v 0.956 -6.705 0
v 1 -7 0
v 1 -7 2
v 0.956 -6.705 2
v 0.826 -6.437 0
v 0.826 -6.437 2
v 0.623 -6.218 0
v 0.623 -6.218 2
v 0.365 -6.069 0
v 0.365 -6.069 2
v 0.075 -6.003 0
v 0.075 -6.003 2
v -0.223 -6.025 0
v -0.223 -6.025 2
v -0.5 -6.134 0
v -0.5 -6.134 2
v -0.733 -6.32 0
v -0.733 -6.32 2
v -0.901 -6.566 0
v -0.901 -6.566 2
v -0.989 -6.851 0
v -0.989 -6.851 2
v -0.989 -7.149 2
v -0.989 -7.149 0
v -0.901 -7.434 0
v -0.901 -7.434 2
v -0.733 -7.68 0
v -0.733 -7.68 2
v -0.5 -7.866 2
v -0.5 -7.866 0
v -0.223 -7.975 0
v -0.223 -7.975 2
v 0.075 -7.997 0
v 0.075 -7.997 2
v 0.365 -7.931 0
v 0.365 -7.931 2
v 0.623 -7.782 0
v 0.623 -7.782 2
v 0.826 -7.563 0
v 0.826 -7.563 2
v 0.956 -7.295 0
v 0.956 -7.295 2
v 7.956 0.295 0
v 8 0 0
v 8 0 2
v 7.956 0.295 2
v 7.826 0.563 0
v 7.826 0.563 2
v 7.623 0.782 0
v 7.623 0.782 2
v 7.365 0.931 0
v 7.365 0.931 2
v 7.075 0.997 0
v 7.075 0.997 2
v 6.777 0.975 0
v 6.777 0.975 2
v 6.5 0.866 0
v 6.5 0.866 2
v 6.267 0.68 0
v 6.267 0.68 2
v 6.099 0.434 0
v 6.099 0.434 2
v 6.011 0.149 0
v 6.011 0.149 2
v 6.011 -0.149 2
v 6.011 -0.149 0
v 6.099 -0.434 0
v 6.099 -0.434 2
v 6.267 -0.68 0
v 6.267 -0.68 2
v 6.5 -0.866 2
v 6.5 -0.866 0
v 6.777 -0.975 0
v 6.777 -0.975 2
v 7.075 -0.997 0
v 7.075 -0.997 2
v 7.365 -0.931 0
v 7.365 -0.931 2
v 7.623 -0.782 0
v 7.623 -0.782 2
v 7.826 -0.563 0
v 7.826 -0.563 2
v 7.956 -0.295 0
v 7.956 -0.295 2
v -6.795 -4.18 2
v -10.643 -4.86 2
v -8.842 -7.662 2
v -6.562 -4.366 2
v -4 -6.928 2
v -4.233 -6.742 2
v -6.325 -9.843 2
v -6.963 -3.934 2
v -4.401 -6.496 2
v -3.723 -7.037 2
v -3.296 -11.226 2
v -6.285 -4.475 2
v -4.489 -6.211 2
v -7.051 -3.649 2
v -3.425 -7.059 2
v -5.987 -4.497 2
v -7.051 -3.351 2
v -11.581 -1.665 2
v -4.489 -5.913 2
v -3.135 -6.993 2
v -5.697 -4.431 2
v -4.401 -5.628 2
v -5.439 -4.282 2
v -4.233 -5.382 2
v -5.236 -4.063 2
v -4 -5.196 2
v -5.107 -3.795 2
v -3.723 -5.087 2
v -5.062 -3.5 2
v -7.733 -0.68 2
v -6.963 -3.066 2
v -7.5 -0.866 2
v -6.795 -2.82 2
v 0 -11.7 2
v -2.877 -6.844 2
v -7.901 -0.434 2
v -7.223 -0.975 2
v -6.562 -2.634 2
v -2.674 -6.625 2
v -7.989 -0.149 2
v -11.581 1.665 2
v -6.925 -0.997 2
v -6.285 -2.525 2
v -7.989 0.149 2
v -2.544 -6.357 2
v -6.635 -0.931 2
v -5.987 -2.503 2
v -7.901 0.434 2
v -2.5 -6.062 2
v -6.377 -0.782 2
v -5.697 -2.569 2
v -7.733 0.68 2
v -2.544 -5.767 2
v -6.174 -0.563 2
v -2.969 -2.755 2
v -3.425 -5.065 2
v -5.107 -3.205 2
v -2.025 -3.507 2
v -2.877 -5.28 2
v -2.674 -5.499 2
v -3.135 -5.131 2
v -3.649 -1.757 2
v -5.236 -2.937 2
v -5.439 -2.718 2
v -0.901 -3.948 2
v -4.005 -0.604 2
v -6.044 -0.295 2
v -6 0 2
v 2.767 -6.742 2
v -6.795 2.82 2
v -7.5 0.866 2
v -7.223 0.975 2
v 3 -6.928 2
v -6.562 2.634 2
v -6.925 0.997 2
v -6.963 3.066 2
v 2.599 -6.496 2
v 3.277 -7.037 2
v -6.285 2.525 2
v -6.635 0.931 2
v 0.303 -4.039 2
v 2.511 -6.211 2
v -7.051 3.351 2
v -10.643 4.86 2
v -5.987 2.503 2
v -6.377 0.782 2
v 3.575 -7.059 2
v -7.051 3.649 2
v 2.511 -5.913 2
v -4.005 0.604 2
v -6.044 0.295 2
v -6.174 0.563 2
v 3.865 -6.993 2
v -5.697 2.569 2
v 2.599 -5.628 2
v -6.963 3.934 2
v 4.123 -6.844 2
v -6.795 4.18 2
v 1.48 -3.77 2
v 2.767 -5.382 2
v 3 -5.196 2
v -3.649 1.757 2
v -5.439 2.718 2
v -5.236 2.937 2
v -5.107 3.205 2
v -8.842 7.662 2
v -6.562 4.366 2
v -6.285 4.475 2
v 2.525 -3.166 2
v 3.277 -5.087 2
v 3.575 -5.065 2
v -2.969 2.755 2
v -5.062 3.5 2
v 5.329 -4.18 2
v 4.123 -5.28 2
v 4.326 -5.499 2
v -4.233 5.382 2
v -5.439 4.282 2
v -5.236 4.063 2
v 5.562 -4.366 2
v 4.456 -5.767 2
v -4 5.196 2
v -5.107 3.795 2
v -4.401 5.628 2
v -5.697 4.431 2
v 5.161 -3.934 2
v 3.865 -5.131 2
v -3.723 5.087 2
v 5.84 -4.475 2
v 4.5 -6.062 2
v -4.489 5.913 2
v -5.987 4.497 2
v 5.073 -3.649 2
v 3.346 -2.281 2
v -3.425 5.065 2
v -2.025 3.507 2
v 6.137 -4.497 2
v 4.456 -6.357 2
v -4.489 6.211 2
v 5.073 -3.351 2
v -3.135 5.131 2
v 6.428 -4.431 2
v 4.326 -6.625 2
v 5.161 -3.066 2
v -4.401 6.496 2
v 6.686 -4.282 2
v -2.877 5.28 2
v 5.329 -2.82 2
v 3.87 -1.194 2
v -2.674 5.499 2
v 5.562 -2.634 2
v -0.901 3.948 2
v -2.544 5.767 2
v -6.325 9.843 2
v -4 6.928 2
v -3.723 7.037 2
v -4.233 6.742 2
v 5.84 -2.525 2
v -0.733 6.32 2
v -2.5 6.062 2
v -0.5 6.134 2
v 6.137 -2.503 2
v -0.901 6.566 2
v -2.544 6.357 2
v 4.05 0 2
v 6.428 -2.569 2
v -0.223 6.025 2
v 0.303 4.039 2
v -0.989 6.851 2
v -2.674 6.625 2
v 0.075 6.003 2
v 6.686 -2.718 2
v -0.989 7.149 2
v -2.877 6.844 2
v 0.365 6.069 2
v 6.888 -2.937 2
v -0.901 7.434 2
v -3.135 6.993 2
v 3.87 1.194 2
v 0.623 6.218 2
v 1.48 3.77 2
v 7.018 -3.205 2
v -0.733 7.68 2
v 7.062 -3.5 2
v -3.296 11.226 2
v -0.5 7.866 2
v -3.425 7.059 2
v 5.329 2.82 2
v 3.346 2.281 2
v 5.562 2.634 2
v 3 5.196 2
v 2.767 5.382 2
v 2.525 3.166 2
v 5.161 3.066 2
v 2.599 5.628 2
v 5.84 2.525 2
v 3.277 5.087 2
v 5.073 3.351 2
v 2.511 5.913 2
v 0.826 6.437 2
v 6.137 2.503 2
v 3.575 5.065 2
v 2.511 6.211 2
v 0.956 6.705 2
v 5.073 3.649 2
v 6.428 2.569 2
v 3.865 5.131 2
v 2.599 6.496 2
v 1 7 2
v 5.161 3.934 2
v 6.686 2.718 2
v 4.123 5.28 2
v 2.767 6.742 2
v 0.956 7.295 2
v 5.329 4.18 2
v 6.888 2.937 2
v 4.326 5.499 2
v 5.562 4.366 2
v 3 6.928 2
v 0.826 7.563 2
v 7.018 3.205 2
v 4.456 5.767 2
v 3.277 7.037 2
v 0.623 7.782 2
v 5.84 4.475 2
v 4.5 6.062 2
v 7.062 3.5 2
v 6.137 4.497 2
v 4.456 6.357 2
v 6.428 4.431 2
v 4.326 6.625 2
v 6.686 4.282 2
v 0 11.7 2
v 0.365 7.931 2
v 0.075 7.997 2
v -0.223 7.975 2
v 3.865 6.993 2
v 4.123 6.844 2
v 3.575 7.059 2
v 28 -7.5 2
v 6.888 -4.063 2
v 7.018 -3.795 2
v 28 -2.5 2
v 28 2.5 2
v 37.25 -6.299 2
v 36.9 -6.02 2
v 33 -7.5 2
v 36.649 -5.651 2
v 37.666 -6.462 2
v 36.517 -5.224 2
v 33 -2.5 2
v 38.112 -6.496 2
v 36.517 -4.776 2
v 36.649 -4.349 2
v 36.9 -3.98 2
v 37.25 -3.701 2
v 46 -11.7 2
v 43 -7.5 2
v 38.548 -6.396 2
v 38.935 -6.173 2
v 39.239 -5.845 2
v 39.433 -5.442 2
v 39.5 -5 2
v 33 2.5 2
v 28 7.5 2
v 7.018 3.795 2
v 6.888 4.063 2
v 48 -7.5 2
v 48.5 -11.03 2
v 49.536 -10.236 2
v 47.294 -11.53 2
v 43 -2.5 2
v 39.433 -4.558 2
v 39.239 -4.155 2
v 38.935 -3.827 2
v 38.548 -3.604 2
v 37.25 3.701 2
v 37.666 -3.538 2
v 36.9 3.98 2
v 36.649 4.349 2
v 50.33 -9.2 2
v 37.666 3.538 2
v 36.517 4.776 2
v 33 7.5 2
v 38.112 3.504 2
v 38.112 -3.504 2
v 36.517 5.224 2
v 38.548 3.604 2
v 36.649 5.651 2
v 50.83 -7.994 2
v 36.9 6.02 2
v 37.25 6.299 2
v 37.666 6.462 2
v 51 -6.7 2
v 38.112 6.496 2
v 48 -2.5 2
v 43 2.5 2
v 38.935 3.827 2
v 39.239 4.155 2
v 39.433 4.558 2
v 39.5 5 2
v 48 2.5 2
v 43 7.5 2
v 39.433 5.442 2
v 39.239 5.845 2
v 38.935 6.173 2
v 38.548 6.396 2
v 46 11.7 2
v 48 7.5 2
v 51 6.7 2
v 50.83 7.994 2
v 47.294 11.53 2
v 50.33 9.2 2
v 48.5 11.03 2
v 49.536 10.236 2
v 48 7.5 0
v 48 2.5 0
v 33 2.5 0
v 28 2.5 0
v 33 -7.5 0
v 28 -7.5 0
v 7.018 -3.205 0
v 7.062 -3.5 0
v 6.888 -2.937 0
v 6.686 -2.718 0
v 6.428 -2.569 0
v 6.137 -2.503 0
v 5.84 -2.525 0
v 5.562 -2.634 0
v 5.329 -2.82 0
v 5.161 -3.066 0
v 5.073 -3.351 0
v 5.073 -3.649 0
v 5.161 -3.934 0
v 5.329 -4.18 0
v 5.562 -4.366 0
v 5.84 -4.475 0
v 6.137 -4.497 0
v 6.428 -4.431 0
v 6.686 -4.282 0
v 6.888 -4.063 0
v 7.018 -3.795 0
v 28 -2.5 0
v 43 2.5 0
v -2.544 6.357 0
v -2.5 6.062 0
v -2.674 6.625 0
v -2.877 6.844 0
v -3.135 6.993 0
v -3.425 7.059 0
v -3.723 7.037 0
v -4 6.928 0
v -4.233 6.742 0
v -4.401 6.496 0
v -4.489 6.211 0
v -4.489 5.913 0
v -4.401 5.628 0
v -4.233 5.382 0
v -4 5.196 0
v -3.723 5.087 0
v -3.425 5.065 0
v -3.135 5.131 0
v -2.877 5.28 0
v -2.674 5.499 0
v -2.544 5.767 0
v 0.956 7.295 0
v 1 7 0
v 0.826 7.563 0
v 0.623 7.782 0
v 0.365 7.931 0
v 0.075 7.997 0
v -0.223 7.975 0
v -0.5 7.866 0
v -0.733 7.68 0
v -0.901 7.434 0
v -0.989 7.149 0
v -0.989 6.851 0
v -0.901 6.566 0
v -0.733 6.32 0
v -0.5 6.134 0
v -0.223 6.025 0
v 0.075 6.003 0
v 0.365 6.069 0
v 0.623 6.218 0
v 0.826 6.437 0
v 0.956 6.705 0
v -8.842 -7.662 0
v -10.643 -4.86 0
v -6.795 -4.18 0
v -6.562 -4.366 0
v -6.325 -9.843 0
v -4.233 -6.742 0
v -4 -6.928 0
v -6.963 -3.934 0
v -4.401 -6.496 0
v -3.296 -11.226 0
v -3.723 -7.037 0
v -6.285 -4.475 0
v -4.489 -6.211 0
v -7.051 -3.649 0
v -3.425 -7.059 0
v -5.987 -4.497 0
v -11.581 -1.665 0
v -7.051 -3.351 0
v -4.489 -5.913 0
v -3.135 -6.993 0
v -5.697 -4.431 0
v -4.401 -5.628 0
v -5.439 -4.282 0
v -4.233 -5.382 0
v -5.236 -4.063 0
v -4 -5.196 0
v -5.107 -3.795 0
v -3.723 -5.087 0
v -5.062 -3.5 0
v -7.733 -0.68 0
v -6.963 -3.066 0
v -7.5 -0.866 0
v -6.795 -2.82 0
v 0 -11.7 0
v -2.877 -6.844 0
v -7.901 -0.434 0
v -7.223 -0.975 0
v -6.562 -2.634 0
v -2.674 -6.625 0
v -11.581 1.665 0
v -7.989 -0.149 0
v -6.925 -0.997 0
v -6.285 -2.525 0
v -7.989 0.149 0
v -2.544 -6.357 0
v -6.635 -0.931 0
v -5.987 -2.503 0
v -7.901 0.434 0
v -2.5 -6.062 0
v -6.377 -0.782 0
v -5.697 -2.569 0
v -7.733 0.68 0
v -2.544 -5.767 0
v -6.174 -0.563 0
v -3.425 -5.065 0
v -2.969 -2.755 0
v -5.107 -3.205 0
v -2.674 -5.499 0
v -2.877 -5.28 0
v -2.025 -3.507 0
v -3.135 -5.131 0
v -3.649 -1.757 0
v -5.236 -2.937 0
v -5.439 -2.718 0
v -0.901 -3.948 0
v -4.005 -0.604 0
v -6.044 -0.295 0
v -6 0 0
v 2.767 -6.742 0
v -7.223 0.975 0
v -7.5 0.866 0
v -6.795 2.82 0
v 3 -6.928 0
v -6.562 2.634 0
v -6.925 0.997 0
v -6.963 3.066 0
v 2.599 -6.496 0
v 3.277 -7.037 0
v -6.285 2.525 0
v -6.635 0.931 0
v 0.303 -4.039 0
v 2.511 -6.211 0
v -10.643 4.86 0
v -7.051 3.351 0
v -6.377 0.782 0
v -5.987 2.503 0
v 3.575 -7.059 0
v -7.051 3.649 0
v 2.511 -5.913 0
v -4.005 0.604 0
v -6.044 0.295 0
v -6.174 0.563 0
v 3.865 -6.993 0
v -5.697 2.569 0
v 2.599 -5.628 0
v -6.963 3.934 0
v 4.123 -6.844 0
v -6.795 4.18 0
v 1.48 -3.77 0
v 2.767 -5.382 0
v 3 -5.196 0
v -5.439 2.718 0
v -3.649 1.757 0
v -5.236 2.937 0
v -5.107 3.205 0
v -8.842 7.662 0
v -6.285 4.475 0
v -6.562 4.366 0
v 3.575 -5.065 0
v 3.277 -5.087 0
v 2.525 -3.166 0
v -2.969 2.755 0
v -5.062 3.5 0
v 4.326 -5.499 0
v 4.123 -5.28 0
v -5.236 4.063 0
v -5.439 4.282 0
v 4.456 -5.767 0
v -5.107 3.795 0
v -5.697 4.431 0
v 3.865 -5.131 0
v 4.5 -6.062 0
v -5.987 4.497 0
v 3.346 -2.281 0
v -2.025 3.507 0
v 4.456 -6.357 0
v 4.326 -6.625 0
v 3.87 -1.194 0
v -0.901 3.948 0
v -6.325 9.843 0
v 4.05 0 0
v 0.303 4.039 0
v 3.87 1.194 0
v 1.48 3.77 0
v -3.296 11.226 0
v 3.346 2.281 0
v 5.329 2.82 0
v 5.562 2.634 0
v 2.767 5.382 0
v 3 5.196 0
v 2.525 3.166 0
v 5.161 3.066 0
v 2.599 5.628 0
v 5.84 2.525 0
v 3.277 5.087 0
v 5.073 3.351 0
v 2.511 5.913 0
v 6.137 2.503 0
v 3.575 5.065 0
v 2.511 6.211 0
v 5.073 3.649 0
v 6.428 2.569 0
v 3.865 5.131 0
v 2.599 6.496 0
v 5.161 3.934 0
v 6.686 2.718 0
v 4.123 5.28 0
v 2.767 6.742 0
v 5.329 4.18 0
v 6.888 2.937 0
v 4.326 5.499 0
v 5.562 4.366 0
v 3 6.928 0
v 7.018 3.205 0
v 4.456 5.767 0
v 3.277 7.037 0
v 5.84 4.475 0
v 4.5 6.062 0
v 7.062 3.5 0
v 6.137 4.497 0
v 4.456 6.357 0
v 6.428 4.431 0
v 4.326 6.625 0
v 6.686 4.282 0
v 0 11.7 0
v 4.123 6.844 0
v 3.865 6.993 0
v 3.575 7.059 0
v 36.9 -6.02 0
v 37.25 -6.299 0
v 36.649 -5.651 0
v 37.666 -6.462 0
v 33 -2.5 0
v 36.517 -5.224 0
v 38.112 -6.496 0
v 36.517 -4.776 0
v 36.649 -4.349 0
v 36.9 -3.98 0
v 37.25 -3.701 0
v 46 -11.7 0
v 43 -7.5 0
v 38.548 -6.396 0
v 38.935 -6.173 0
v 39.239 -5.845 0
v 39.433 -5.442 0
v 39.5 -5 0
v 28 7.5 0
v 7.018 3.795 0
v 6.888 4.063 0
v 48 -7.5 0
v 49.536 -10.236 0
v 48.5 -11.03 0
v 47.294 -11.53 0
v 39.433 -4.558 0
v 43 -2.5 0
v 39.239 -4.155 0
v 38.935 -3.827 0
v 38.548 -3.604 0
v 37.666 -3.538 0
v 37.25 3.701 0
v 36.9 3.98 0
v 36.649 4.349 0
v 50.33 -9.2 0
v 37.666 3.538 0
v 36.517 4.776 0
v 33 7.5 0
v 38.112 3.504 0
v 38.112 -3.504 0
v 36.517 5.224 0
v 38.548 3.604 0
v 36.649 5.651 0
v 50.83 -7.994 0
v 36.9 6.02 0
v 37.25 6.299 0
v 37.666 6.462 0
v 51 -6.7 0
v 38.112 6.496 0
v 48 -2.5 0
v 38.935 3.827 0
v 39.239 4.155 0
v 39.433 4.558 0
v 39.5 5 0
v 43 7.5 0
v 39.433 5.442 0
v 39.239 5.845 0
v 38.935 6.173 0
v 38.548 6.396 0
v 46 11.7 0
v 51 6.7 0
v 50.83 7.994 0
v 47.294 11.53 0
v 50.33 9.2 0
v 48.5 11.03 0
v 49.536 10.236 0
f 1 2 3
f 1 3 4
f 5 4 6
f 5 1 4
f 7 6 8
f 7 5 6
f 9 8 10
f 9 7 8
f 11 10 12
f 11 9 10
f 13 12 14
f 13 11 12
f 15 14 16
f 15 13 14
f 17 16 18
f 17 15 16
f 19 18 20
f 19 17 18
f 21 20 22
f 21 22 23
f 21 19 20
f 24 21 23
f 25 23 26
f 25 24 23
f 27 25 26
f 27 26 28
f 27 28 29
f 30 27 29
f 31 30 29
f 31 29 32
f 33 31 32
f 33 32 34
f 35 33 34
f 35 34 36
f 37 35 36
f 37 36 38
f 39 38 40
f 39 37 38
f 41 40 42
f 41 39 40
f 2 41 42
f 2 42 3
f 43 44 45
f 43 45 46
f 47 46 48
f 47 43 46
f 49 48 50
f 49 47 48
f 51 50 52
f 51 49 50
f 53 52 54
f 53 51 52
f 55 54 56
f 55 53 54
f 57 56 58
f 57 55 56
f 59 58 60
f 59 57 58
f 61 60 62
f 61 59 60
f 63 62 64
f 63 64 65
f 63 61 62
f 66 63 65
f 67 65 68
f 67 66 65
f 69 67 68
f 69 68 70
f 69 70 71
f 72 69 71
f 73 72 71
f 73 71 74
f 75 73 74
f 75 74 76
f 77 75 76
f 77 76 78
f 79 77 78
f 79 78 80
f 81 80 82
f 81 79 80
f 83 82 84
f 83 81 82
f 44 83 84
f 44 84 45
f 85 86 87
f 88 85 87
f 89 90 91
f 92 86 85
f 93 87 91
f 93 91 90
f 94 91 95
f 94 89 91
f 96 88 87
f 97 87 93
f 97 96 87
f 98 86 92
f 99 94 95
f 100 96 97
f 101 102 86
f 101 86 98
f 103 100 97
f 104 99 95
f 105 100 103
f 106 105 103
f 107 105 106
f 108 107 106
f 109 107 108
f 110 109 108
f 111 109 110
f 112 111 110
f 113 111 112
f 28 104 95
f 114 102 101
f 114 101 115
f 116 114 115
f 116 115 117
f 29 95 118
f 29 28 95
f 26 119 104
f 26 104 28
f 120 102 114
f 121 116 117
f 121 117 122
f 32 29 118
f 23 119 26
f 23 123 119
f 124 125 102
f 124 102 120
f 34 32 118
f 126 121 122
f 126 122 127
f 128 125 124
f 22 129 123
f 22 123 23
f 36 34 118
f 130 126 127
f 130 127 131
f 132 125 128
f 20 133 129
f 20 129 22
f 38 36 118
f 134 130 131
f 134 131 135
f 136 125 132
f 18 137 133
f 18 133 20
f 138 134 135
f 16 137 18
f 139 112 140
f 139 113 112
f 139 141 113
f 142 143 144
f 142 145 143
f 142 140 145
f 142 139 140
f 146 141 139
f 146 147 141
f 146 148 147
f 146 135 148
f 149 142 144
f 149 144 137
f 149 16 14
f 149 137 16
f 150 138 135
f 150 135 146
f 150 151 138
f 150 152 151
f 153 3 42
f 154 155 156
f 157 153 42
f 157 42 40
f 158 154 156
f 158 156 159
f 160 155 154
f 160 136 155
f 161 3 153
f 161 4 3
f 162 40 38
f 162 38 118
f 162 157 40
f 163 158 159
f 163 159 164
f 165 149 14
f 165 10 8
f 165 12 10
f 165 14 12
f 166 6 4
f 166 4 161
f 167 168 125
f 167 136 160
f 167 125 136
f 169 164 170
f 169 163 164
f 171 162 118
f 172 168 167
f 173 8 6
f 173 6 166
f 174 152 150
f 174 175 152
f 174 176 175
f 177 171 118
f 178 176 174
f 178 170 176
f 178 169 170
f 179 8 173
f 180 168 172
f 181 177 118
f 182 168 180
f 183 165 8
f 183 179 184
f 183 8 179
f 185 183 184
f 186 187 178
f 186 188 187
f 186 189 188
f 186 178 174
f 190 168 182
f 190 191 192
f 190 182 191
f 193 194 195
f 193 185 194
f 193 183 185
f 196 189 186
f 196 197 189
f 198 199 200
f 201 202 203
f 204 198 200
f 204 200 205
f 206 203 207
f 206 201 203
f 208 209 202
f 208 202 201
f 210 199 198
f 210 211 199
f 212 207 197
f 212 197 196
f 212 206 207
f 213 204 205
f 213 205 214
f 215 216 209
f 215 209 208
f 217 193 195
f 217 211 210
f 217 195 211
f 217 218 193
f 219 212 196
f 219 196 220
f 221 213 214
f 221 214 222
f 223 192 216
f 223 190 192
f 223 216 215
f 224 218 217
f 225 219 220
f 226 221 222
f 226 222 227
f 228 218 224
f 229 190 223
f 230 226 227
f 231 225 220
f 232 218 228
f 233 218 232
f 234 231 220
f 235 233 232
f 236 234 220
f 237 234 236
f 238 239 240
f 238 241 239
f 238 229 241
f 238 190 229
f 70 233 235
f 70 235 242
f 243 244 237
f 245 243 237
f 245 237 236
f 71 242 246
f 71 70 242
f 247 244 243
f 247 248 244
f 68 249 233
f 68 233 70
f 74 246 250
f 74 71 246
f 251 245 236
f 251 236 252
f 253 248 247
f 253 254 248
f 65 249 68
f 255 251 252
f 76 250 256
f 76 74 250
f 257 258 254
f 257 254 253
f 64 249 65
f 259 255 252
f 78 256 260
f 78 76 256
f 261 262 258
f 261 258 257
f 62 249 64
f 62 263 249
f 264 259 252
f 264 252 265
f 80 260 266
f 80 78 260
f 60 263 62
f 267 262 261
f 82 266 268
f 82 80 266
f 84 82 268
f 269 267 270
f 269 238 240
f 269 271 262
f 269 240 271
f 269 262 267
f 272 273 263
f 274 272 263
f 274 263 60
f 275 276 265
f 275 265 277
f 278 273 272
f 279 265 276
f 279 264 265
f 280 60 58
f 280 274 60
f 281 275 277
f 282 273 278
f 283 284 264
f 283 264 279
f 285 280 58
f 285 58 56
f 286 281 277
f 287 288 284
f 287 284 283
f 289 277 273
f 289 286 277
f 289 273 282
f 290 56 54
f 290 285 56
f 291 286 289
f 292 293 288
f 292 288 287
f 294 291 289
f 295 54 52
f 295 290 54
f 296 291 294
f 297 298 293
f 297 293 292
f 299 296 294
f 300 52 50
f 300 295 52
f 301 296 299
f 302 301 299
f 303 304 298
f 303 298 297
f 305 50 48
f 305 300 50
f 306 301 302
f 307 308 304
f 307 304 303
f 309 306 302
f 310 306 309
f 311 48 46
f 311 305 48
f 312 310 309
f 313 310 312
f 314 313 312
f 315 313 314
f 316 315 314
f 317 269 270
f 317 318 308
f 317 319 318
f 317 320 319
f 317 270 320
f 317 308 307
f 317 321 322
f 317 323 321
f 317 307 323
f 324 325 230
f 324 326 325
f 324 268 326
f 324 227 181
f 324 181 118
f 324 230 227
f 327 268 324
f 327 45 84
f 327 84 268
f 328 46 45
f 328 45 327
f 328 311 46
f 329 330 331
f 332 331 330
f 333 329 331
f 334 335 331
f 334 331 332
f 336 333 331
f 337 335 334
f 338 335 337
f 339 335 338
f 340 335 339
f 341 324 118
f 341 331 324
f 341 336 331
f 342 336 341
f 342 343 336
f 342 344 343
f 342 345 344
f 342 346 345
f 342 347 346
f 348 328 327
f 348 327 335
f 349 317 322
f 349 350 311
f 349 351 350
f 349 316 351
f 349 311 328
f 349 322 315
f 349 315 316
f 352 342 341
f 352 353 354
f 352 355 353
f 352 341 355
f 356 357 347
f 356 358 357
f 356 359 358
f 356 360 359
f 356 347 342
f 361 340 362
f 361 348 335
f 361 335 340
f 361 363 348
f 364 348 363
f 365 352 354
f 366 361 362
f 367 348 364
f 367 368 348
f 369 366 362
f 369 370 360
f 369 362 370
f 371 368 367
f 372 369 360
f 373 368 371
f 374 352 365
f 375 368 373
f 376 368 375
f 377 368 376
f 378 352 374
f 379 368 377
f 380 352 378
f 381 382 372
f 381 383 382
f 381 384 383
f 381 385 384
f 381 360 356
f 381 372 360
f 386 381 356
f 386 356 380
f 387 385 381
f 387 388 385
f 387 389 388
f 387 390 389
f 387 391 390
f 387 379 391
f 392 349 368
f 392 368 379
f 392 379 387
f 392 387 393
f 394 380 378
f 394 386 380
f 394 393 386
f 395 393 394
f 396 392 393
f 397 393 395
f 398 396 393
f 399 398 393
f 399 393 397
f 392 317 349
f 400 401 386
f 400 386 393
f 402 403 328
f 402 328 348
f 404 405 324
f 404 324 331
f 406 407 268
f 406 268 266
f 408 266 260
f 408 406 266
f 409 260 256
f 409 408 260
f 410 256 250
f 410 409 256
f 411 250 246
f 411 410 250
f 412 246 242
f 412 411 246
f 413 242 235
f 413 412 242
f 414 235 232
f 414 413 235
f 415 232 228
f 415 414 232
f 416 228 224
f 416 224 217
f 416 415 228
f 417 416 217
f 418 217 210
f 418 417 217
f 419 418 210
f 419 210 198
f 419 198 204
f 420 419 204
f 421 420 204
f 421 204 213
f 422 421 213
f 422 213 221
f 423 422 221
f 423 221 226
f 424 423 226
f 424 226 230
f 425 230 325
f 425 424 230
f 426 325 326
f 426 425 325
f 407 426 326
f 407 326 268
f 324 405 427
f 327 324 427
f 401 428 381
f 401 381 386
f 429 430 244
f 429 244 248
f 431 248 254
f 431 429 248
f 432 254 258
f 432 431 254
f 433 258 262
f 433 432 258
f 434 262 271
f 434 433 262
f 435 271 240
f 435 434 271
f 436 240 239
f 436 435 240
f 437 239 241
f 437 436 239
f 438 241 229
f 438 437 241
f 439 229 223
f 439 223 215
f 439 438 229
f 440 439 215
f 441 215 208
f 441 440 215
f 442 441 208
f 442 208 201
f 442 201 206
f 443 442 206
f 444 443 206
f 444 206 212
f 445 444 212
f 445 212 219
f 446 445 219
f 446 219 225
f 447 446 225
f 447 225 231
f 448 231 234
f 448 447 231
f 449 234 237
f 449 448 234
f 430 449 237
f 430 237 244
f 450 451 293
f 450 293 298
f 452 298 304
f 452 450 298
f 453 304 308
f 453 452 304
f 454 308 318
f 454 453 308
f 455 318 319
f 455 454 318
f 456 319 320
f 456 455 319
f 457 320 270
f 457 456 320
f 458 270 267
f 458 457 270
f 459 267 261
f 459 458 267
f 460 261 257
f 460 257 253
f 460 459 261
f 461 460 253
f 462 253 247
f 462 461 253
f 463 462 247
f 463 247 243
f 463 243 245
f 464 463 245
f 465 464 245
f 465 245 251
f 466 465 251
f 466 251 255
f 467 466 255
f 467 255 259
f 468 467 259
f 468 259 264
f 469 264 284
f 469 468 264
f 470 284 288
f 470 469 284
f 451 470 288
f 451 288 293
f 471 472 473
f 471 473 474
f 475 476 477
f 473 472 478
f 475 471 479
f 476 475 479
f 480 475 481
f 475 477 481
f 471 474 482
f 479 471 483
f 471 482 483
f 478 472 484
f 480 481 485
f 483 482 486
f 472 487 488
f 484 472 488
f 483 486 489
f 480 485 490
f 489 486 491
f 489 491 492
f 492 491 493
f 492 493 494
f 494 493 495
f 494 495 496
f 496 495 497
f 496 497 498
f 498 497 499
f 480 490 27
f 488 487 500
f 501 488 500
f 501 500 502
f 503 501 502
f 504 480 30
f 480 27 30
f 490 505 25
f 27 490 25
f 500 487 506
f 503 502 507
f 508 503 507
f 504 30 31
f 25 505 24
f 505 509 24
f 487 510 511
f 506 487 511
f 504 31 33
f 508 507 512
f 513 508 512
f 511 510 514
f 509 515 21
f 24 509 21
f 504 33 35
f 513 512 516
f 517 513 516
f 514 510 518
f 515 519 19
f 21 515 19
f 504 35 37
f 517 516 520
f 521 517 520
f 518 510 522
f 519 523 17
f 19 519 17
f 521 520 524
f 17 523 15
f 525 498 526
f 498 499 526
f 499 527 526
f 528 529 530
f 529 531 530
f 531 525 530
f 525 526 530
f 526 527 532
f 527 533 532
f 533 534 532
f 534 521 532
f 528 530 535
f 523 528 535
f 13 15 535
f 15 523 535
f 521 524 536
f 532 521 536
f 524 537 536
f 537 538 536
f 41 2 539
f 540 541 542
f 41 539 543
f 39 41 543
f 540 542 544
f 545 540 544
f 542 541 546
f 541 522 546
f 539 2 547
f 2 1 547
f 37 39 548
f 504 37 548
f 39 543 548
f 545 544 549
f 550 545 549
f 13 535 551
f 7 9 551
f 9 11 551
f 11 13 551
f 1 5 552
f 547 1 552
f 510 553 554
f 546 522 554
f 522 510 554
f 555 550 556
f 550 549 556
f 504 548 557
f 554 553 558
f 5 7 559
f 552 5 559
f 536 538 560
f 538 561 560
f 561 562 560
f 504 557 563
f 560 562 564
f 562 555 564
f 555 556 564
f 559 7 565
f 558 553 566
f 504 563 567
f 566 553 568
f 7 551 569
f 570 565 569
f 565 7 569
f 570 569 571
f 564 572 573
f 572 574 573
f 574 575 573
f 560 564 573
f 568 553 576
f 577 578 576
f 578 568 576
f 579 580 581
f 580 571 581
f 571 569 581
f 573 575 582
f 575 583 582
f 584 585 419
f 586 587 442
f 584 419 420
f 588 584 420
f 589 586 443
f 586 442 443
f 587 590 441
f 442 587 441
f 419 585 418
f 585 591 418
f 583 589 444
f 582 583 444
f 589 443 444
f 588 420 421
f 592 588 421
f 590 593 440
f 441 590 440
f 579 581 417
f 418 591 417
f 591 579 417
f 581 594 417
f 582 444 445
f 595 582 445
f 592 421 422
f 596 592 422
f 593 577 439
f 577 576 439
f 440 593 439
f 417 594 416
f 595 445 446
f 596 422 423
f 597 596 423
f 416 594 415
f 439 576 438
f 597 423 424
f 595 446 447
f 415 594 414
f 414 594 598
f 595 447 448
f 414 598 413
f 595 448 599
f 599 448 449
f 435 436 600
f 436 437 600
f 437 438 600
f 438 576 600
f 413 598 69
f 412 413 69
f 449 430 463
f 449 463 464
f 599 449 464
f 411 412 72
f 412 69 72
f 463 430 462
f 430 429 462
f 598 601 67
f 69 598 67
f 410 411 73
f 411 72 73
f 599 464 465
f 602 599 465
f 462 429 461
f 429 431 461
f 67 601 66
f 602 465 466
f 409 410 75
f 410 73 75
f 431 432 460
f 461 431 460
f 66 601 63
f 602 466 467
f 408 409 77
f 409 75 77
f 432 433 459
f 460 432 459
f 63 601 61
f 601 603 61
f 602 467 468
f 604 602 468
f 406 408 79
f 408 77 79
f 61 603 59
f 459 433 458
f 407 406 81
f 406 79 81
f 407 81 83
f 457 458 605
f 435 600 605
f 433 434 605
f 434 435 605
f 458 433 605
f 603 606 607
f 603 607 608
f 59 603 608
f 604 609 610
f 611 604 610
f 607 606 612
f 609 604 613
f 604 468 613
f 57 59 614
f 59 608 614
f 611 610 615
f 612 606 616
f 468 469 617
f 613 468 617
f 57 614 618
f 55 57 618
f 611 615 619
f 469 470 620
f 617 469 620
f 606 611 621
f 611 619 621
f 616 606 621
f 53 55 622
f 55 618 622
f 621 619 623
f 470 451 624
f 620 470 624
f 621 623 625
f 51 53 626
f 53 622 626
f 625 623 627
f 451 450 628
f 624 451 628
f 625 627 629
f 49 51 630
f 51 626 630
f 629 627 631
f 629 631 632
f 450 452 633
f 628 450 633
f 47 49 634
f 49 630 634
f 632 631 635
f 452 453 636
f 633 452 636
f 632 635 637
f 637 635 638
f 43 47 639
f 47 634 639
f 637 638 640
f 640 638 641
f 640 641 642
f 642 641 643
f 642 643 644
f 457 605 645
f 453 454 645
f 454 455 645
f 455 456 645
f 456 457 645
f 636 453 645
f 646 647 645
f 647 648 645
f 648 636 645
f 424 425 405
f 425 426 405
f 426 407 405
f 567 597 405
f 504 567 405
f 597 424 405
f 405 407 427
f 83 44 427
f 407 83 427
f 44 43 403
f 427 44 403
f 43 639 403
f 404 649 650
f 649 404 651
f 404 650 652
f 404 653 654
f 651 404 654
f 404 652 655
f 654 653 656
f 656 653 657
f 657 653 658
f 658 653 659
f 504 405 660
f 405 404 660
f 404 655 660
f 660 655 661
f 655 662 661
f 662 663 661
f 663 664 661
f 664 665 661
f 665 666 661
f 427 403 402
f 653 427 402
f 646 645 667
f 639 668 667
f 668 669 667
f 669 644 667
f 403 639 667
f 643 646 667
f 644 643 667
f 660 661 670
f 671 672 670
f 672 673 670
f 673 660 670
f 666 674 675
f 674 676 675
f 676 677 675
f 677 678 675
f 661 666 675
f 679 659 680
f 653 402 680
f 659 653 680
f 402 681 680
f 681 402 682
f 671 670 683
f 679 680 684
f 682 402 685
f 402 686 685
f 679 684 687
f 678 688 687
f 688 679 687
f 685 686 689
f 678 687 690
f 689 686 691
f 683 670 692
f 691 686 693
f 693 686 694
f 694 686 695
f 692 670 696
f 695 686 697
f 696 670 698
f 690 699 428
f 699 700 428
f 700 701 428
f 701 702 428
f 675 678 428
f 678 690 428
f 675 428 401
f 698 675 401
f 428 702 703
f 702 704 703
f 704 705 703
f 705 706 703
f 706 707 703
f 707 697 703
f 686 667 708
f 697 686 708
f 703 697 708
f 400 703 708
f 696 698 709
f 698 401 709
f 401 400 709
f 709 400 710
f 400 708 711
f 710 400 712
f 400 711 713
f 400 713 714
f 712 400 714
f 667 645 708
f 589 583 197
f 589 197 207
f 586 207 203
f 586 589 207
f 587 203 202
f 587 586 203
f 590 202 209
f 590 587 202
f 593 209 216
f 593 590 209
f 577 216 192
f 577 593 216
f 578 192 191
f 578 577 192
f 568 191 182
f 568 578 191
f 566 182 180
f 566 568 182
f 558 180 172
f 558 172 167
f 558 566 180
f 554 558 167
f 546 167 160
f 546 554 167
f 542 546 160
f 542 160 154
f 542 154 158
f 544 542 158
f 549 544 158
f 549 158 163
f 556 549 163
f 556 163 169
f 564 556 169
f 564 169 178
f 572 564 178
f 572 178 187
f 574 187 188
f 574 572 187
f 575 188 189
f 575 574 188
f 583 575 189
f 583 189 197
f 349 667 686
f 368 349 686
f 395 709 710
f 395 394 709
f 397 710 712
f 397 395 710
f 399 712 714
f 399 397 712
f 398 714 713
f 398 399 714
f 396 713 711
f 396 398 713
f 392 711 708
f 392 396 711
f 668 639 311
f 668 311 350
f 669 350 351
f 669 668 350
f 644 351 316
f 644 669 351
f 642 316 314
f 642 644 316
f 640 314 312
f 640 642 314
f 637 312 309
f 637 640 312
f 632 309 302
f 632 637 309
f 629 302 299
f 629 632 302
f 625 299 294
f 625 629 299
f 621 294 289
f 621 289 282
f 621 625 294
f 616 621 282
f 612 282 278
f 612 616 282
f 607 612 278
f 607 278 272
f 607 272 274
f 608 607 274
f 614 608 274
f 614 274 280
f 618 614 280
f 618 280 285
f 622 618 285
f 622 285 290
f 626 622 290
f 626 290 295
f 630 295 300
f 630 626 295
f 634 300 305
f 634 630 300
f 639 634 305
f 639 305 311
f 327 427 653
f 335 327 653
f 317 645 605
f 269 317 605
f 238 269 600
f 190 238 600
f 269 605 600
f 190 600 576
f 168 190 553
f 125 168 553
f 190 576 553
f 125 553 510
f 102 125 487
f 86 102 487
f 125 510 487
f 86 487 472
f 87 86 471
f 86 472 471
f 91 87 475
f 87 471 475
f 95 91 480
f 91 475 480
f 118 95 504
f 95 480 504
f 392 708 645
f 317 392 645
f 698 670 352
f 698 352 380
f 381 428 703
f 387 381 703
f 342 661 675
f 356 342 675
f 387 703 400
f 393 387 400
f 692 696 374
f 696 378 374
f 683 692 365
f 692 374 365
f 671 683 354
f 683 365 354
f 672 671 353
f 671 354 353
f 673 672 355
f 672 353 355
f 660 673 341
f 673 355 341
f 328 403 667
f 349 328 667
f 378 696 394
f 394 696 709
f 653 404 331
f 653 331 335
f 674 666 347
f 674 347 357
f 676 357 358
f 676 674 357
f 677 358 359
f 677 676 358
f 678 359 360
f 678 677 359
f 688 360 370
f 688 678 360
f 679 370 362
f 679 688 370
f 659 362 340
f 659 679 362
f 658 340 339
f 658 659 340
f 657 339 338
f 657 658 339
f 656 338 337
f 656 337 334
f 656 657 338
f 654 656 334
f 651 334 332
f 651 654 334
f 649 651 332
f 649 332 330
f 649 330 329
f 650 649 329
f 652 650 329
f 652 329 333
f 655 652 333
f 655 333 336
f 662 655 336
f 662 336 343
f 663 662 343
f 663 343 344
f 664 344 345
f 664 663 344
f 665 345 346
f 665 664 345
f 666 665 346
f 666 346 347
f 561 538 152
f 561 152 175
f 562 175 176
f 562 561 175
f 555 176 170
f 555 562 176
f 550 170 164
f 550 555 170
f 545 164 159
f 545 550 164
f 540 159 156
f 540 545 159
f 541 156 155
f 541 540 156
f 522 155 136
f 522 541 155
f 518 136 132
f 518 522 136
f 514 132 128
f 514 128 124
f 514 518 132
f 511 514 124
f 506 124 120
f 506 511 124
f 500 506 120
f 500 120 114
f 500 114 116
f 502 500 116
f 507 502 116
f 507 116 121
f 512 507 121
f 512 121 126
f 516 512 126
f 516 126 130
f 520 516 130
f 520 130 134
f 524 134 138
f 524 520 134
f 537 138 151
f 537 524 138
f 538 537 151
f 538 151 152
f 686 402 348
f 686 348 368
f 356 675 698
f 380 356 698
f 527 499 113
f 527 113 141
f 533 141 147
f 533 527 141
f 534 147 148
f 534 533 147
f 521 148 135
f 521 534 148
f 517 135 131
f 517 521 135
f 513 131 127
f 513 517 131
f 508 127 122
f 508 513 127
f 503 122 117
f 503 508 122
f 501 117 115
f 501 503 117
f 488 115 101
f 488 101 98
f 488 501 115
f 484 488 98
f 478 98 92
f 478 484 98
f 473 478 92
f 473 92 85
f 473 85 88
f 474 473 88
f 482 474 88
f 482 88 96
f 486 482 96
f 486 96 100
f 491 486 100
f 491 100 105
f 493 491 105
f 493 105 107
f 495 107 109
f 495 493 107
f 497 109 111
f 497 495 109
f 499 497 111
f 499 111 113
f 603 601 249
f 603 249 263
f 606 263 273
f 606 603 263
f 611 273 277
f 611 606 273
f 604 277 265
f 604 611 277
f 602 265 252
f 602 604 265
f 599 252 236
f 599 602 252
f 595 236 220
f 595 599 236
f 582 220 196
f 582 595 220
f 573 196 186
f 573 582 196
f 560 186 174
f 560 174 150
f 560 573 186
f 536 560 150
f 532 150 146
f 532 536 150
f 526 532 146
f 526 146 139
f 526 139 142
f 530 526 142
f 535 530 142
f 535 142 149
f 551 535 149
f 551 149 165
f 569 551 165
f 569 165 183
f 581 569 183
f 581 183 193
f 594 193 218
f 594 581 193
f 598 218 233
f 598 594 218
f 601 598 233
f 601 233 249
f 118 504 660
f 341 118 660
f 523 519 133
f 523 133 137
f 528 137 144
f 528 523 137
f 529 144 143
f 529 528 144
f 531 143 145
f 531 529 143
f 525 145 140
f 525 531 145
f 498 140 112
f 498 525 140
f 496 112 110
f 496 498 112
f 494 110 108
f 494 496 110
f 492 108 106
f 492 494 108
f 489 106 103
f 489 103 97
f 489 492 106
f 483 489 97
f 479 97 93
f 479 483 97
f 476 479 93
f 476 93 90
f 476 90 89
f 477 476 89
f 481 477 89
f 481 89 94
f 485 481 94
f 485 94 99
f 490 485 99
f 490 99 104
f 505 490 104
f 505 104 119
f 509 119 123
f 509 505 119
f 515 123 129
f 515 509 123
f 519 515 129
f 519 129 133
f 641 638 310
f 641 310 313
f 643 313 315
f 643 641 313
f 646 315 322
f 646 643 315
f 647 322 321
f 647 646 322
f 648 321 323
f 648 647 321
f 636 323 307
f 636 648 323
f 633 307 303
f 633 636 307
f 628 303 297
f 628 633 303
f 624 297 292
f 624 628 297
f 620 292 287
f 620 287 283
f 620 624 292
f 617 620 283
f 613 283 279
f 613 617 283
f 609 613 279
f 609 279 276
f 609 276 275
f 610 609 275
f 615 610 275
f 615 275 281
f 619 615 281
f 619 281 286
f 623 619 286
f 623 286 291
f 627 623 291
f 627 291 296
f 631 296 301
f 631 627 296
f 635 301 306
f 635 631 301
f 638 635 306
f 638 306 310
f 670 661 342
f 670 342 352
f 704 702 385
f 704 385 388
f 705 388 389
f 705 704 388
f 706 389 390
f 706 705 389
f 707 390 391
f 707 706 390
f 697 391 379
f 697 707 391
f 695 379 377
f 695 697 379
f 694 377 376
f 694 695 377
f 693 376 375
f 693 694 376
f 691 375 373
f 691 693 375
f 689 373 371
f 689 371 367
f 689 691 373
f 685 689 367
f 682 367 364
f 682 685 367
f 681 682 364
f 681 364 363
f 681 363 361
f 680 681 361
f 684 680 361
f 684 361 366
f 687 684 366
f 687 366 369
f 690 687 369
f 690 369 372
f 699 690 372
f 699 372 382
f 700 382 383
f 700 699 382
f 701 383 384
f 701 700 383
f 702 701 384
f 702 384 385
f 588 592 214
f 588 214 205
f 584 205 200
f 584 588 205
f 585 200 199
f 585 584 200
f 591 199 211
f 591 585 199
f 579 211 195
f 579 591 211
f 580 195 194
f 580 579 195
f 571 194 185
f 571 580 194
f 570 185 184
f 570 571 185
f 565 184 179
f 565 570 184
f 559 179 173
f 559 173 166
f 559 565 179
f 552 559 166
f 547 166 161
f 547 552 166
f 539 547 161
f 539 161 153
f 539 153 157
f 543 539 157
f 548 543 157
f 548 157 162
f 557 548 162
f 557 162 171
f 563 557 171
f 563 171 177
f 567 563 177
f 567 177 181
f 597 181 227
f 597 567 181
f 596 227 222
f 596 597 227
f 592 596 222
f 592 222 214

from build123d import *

# Parameters (mm, degrees)
BOSS_EXTRUDE1_OUTLINE_R   = 1
BOSS_EXTRUDE1_OUTLINE_W   = 5
BOSS_EXTRUDE1_OUTLINE_H   = 5
BOSS_EXTRUDE1_OUTLINE_R_2 = 1.5
BOSS_EXTRUDE1_OUTLINE_R_3 = 4.05
BOSS_EXTRUDE1_DEPTH       = 2
CONG_1_R                  = 5


# Read off the part's stored shape, not the designer's step: Boss-Extrude1
with BuildPart() as part:
    # Boss-Extrude1 outline → Boss-Extrude1 (new body)
    with BuildSketch(Plane.XY):
        with BuildLine():
            Line((51, -11.7), (51, 11.7))
            Line((51, 11.7), (0, 11.7))
            ThreePointArc((0, 11.7), (-11.7, 0), (0, -11.7))
            Line((0, -11.7), (51, -11.7))
        make_face()
        with Locations((0, -7)):
            Circle(BOSS_EXTRUDE1_OUTLINE_R, mode=Mode.SUBTRACT)
        with Locations((-3.5, -6.062177826)):
            Circle(BOSS_EXTRUDE1_OUTLINE_R, mode=Mode.SUBTRACT)
        with Locations((3.5, -6.062177826)):
            Circle(BOSS_EXTRUDE1_OUTLINE_R, mode=Mode.SUBTRACT)
        with Locations((-6.062177826, -3.5)):
            Circle(BOSS_EXTRUDE1_OUTLINE_R, mode=Mode.SUBTRACT)
        with Locations((6.062177826, -3.5)):
            Circle(BOSS_EXTRUDE1_OUTLINE_R, mode=Mode.SUBTRACT)
        with Locations((30.5, -5)):
            Rectangle(BOSS_EXTRUDE1_OUTLINE_W, BOSS_EXTRUDE1_OUTLINE_H, mode=Mode.SUBTRACT)
        with Locations((38, -5)):
            Circle(BOSS_EXTRUDE1_OUTLINE_R_2, mode=Mode.SUBTRACT)
        with Locations((45.5, -5)):
            Rectangle(BOSS_EXTRUDE1_OUTLINE_W, BOSS_EXTRUDE1_OUTLINE_H, mode=Mode.SUBTRACT)
        with Locations((-7, 0)):
            Circle(BOSS_EXTRUDE1_OUTLINE_R, mode=Mode.SUBTRACT)
        Circle(BOSS_EXTRUDE1_OUTLINE_R_3, mode=Mode.SUBTRACT)
        with Locations((-6.062177826, 3.5)):
            Circle(BOSS_EXTRUDE1_OUTLINE_R, mode=Mode.SUBTRACT)
        with Locations((7, 0)):
            Circle(BOSS_EXTRUDE1_OUTLINE_R, mode=Mode.SUBTRACT)
        with Locations((6.062177826, 3.5)):
            Circle(BOSS_EXTRUDE1_OUTLINE_R, mode=Mode.SUBTRACT)
        with Locations((-3.5, 6.062177826)):
            Circle(BOSS_EXTRUDE1_OUTLINE_R, mode=Mode.SUBTRACT)
        with Locations((0, 7)):
            Circle(BOSS_EXTRUDE1_OUTLINE_R, mode=Mode.SUBTRACT)
        with Locations((3.5, 6.062177826)):
            Circle(BOSS_EXTRUDE1_OUTLINE_R, mode=Mode.SUBTRACT)
        with Locations((30.5, 5)):
            Rectangle(BOSS_EXTRUDE1_OUTLINE_W, BOSS_EXTRUDE1_OUTLINE_H, mode=Mode.SUBTRACT)
        with Locations((38, 5)):
            Circle(BOSS_EXTRUDE1_OUTLINE_R_2, mode=Mode.SUBTRACT)
        with Locations((45.5, 5)):
            Rectangle(BOSS_EXTRUDE1_OUTLINE_W, BOSS_EXTRUDE1_OUTLINE_H, mode=Mode.SUBTRACT)
    extrude(amount=BOSS_EXTRUDE1_DEPTH)

    # Congé1
    cong_1_edges = [part.edges().sort_by_distance(p)[0] for p in [
        (51, 11.7, 1),
        (51, -11.7, 1),
    ]]
    fillet(cong_1_edges, radius=CONG_1_R)


solid = part.part
